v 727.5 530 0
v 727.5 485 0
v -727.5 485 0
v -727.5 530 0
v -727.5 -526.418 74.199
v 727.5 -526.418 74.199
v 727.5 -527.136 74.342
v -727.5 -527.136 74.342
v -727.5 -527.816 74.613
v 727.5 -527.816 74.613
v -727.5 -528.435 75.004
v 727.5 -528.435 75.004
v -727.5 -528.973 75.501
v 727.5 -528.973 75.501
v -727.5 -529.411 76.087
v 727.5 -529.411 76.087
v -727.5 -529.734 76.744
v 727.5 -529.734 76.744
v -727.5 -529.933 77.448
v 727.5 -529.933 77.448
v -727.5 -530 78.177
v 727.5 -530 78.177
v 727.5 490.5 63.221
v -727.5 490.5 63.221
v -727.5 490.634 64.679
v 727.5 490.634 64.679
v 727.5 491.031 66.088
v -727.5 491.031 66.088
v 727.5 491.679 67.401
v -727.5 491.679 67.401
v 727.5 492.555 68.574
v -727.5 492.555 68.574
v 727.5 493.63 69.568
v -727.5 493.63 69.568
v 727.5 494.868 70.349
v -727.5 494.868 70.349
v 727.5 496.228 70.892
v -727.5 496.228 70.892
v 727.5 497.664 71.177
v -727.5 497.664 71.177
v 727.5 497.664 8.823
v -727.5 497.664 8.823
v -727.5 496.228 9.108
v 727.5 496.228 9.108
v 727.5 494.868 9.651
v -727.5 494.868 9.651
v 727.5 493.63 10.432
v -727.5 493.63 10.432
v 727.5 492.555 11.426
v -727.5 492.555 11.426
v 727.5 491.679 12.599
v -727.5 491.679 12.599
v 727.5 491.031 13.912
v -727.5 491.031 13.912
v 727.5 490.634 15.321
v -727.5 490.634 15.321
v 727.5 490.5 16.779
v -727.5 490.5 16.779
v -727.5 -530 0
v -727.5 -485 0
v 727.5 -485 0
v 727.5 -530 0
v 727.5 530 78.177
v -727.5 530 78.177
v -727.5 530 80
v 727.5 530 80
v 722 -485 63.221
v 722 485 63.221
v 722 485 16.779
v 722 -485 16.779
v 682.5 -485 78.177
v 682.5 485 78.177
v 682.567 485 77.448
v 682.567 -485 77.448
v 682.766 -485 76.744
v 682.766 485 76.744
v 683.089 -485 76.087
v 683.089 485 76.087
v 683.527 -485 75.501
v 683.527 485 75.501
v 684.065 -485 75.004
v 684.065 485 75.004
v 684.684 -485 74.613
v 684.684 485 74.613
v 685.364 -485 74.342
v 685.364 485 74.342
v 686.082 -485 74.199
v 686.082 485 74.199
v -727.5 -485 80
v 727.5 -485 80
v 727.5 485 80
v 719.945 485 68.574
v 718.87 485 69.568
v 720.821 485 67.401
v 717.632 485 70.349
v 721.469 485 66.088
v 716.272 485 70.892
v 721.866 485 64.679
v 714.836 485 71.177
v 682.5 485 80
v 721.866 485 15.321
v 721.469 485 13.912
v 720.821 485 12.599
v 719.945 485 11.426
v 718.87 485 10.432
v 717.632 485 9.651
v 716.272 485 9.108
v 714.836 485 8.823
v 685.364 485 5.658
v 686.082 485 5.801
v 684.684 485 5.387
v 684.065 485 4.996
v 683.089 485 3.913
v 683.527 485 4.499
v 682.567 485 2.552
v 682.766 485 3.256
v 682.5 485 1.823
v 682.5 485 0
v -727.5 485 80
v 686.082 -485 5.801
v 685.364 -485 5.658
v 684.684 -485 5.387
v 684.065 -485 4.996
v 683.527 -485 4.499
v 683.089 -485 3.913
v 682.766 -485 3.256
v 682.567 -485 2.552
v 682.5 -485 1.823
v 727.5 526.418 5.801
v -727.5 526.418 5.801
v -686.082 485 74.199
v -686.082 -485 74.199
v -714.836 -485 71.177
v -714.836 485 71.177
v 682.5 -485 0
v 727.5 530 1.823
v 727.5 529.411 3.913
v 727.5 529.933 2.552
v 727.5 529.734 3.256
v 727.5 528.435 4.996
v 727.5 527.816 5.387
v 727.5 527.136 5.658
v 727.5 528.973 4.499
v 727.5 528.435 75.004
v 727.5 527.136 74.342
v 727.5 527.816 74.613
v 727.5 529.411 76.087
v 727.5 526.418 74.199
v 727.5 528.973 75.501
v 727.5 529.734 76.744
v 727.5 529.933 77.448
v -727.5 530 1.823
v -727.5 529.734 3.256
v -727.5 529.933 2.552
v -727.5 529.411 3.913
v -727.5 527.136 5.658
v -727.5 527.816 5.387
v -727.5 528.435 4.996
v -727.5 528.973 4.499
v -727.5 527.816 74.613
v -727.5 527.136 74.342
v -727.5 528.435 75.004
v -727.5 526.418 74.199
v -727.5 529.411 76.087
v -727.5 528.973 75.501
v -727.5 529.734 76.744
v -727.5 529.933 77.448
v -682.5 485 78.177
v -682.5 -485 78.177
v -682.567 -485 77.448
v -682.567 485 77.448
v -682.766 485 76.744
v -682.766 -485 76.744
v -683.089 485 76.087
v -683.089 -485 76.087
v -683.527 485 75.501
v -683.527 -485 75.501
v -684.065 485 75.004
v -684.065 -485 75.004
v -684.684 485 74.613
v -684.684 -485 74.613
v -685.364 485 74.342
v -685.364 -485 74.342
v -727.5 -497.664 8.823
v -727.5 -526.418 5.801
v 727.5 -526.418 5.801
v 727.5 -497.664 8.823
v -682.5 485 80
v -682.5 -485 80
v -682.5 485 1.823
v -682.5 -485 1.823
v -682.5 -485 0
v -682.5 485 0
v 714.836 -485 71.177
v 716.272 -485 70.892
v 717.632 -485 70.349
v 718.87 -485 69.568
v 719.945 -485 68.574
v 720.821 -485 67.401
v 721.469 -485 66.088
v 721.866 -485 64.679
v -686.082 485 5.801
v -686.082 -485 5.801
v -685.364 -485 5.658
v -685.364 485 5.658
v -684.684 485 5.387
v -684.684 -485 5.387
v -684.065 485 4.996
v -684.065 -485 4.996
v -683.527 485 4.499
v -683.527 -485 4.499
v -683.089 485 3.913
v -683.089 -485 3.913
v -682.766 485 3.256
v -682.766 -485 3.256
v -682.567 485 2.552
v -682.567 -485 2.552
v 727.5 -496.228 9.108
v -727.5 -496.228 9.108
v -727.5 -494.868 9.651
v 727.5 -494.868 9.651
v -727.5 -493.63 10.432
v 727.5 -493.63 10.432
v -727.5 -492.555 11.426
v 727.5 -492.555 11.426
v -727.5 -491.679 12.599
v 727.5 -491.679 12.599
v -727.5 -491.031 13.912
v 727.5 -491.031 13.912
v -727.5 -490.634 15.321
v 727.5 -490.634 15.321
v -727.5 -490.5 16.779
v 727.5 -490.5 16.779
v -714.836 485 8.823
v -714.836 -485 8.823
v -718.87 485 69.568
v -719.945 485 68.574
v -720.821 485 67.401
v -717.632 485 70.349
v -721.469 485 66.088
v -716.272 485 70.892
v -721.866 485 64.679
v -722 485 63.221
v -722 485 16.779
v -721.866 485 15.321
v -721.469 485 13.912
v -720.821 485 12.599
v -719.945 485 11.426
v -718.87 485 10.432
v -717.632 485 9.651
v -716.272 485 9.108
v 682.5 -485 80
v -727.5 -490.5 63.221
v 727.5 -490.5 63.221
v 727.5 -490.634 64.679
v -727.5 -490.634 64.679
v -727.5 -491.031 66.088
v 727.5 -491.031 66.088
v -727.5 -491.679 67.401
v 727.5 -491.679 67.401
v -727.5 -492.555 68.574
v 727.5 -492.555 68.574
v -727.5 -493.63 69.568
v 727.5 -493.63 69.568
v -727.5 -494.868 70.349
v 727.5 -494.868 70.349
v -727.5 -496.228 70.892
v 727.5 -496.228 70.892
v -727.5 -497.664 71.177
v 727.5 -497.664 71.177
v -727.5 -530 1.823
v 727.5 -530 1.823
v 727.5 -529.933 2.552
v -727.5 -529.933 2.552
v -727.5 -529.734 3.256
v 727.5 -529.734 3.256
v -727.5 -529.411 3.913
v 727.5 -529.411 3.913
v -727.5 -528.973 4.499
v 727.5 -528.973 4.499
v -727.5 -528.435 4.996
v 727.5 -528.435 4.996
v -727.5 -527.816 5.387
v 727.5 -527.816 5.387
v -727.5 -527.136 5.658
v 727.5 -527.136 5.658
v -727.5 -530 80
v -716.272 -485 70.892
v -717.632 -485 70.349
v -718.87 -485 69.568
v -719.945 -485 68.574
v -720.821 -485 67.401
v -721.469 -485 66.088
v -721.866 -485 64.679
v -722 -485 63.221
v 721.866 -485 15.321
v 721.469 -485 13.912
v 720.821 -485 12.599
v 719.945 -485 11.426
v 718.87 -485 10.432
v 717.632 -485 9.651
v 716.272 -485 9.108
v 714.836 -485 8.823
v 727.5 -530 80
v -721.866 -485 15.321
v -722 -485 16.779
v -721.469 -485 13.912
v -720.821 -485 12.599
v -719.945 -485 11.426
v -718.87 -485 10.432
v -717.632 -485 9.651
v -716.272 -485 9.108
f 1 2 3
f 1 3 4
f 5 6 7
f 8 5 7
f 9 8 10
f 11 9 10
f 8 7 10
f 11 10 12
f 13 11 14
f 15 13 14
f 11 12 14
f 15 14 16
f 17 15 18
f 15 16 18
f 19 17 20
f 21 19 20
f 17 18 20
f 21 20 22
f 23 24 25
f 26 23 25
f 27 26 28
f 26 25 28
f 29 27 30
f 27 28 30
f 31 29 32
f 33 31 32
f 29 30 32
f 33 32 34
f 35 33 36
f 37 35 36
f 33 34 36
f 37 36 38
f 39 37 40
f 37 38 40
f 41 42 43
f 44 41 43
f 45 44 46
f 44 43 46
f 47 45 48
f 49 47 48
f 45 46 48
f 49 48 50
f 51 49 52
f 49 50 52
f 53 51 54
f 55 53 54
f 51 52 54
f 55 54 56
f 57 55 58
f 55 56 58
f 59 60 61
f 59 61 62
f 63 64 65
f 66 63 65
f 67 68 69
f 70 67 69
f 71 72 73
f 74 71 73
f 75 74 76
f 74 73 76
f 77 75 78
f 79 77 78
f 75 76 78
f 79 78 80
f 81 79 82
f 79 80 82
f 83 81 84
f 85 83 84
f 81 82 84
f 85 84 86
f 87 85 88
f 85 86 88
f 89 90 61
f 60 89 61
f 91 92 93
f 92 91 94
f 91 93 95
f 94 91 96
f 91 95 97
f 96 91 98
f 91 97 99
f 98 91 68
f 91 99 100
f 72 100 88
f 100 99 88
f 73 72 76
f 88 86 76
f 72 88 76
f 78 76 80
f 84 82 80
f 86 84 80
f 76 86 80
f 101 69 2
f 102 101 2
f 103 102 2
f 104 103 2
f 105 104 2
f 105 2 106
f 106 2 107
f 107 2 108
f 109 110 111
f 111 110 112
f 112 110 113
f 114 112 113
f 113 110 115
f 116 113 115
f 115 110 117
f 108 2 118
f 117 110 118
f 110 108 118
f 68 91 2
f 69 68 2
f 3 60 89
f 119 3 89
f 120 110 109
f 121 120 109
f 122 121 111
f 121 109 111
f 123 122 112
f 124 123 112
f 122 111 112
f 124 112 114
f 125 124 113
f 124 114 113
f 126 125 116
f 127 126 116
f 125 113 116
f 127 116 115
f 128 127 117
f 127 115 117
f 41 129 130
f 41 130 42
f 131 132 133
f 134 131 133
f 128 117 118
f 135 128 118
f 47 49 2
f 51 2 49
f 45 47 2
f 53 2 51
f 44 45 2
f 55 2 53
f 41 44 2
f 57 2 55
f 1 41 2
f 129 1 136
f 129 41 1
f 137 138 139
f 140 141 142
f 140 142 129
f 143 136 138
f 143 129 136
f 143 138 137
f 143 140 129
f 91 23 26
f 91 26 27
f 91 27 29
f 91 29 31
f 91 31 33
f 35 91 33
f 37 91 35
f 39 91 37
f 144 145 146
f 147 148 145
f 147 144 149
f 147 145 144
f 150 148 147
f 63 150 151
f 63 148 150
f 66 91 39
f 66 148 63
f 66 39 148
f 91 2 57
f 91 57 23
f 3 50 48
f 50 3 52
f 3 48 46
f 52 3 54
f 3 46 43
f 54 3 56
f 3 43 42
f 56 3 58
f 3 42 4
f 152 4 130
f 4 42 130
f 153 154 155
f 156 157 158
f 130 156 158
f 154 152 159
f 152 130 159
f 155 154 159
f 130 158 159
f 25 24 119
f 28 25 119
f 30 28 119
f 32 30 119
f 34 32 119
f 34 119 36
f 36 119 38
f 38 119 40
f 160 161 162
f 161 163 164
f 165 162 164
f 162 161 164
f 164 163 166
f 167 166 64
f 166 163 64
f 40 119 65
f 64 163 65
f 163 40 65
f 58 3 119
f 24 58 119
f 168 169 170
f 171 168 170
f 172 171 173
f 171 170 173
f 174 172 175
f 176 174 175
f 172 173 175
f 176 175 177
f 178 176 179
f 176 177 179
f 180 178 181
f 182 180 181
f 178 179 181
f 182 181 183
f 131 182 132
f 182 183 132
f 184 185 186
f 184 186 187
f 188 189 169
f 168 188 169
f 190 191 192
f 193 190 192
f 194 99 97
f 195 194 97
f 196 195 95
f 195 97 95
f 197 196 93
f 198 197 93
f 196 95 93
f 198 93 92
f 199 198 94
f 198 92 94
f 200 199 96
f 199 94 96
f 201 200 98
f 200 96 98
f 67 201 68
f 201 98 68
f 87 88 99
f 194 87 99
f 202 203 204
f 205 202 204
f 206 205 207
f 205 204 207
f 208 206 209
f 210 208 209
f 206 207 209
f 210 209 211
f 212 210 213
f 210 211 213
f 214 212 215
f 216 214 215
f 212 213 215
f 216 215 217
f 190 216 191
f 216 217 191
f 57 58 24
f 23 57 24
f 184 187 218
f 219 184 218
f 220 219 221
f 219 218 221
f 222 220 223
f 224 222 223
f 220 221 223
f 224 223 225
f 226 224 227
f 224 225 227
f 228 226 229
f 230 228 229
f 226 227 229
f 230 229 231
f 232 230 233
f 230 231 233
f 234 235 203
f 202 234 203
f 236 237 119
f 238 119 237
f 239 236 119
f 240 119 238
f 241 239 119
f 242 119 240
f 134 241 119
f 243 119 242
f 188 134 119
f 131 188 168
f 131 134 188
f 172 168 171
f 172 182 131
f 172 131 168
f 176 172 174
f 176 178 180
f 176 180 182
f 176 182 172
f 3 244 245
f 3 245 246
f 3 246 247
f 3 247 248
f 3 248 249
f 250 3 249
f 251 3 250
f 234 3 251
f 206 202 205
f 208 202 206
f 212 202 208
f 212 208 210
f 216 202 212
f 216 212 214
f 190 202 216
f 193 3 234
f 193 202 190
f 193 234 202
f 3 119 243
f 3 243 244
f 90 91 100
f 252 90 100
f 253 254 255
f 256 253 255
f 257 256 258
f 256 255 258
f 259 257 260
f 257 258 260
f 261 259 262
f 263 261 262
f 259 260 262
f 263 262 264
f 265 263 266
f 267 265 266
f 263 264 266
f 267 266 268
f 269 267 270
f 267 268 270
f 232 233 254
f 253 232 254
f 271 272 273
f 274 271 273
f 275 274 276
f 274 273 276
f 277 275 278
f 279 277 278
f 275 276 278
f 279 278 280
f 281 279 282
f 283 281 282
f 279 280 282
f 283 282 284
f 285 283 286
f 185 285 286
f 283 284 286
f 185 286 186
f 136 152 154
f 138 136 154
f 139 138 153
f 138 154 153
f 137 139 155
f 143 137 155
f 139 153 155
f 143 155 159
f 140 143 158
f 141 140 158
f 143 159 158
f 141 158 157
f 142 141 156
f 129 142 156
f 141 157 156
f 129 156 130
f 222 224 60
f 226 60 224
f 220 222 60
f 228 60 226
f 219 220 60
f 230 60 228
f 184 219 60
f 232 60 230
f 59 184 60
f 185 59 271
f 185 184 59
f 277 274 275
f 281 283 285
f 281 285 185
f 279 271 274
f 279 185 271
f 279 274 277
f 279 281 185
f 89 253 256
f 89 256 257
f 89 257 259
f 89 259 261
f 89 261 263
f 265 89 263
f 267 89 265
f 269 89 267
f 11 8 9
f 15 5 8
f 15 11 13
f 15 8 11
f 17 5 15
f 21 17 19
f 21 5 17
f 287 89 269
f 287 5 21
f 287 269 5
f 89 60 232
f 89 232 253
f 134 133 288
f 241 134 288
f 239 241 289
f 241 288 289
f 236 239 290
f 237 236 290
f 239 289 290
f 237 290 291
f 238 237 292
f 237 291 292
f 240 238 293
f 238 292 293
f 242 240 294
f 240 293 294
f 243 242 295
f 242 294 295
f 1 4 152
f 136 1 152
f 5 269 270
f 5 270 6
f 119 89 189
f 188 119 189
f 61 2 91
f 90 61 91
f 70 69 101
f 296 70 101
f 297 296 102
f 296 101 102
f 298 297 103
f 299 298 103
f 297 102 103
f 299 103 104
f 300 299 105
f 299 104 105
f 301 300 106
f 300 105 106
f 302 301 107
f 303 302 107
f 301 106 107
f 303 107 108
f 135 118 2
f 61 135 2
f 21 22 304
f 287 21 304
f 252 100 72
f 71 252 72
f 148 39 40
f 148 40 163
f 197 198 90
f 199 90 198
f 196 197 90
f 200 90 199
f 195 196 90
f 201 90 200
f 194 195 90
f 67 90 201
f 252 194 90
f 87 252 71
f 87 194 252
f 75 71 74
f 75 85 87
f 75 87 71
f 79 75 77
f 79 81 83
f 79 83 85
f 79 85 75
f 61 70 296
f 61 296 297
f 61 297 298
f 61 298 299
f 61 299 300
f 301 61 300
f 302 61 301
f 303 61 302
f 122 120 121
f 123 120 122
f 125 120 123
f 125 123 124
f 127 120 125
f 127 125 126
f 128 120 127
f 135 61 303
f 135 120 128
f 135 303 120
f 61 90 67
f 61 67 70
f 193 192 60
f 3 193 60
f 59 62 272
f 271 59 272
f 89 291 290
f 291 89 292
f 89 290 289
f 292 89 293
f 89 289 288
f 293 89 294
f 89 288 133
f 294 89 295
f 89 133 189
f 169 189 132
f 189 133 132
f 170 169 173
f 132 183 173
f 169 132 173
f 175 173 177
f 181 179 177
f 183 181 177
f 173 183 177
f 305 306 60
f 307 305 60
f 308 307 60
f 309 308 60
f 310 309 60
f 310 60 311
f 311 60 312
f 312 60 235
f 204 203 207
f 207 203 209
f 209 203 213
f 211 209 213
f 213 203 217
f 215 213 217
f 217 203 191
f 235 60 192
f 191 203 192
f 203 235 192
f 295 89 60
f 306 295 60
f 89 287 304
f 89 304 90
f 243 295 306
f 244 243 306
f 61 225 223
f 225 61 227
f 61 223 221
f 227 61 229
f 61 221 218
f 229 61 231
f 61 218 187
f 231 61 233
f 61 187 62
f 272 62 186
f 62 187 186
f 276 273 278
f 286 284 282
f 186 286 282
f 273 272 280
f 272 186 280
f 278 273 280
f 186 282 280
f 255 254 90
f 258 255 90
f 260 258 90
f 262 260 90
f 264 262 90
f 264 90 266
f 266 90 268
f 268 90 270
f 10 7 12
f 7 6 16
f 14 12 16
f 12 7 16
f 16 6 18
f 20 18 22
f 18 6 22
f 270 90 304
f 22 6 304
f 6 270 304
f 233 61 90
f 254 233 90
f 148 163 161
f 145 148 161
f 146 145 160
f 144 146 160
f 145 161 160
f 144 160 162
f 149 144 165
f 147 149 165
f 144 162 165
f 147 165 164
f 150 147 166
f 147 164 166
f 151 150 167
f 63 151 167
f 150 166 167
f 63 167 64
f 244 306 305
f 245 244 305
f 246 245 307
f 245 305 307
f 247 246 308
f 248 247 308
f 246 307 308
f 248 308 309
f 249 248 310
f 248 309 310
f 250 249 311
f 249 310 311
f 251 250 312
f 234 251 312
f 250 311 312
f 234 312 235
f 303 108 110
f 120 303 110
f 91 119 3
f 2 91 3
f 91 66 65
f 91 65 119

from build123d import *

# Parameters (mm, degrees)
C_START                               = -727.5
C_CHANNEL_CONFIGURED_80_X_8_1_DEPTH   = 1455
C_START_2                             = -485
C_CHANNEL_CONFIGURED_80_X_8_1_2_DEPTH = 970
CIRPATTERN1_COUNT                     = 2
CIRPATTERN1_ANGLE                     = 180


# Read off the part's stored shape, not the designer's step: C channel - configured 80 X 8(1)
with BuildPart() as part:
    # C channel - configured 80 X 8(1) outline → C channel - configured 80 X 8(1) (new body)
    with BuildSketch(Plane.YZ.offset(C_START)):
        with BuildLine():
            ThreePointArc((526.418113853, 74.199337243), (528.972579302, 75.500902399), (530, 78.177424825))
            Line((530, 78.177424825), (530, 80))
            Line((530, 80), (485, 80))
            Line((485, 80), (485, 0))
            Line((485, 0), (530, 0))
            Line((530, 0), (530, 1.822575175))
            ThreePointArc((530, 1.822575175), (528.972579302, 4.499097601), (526.418113853, 5.800662757))
            Line((526.418113853, 5.800662757), (497.663772294, 8.822865837))
            ThreePointArc((497.663772294, 8.822865837), (492.554841396, 11.425996149), (490.5, 16.779041))
            Line((490.5, 16.779041), (490.5, 63.220959))
            ThreePointArc((490.5, 63.220959), (492.554841396, 68.574003851), (497.663772294, 71.177134163))
            Line((497.663772294, 71.177134163), (526.418113853, 74.199337243))
        make_face()
    extrude(amount=C_CHANNEL_CONFIGURED_80_X_8_1_DEPTH)


with BuildPart() as body_2:
    # C channel - configured 80 X 8_1 2 outlin → C channel - configured 80 X 8_1 2 (new body)
    with BuildSketch(Plane(origin=(0, 0, 0), x_dir=(1, 0, 0), z_dir=(0, 1, 0)).offset(C_START_2)):
        with BuildLine():
            Line((-727.5, -80), (-682.5, -80))
            Line((-682.5, -80), (-682.5, -78.177424825))
            ThreePointArc((-682.5, -78.177424825), (-683.527420698, -75.500902399), (-686.081886147, -74.199337243))
            Line((-686.081886147, -74.199337243), (-714.836227706, -71.177134163))
            ThreePointArc((-714.836227706, -71.177134163), (-719.945158604, -68.574003851), (-722, -63.220959))
            Line((-722, -63.220959), (-722, -16.779041))
            ThreePointArc((-722, -16.779041), (-719.945158604, -11.425996149), (-714.836227706, -8.822865837))
            Line((-714.836227706, -8.822865837), (-686.081886147, -5.800662757))
            ThreePointArc((-686.081886147, -5.800662757), (-683.527420698, -4.499097601), (-682.5, -1.822575175))
            Line((-682.5, -1.822575175), (-682.5, 0))
            Line((-682.5, 0), (-727.5, 0))
            Line((-727.5, 0), (-727.5, -80))
        make_face()
    extrude(amount=C_CHANNEL_CONFIGURED_80_X_8_1_2_DEPTH)


with BuildPart() as cirpattern1_1:
    # CirPattern1: pattern copy
    add(part.part.rotate(Axis((0, 0, 0), (0, 0, 1)), 1 * CIRPATTERN1_ANGLE / (CIRPATTERN1_COUNT - 1)))


with BuildPart() as cirpattern1_2:
    # CirPattern1: pattern copy
    add(body_2.part.rotate(Axis((0, 0, 0), (0, 0, 1)), 1 * CIRPATTERN1_ANGLE / (CIRPATTERN1_COUNT - 1)))


solid = Compound([part.part, body_2.part, cirpattern1_1.part, cirpattern1_2.part])
